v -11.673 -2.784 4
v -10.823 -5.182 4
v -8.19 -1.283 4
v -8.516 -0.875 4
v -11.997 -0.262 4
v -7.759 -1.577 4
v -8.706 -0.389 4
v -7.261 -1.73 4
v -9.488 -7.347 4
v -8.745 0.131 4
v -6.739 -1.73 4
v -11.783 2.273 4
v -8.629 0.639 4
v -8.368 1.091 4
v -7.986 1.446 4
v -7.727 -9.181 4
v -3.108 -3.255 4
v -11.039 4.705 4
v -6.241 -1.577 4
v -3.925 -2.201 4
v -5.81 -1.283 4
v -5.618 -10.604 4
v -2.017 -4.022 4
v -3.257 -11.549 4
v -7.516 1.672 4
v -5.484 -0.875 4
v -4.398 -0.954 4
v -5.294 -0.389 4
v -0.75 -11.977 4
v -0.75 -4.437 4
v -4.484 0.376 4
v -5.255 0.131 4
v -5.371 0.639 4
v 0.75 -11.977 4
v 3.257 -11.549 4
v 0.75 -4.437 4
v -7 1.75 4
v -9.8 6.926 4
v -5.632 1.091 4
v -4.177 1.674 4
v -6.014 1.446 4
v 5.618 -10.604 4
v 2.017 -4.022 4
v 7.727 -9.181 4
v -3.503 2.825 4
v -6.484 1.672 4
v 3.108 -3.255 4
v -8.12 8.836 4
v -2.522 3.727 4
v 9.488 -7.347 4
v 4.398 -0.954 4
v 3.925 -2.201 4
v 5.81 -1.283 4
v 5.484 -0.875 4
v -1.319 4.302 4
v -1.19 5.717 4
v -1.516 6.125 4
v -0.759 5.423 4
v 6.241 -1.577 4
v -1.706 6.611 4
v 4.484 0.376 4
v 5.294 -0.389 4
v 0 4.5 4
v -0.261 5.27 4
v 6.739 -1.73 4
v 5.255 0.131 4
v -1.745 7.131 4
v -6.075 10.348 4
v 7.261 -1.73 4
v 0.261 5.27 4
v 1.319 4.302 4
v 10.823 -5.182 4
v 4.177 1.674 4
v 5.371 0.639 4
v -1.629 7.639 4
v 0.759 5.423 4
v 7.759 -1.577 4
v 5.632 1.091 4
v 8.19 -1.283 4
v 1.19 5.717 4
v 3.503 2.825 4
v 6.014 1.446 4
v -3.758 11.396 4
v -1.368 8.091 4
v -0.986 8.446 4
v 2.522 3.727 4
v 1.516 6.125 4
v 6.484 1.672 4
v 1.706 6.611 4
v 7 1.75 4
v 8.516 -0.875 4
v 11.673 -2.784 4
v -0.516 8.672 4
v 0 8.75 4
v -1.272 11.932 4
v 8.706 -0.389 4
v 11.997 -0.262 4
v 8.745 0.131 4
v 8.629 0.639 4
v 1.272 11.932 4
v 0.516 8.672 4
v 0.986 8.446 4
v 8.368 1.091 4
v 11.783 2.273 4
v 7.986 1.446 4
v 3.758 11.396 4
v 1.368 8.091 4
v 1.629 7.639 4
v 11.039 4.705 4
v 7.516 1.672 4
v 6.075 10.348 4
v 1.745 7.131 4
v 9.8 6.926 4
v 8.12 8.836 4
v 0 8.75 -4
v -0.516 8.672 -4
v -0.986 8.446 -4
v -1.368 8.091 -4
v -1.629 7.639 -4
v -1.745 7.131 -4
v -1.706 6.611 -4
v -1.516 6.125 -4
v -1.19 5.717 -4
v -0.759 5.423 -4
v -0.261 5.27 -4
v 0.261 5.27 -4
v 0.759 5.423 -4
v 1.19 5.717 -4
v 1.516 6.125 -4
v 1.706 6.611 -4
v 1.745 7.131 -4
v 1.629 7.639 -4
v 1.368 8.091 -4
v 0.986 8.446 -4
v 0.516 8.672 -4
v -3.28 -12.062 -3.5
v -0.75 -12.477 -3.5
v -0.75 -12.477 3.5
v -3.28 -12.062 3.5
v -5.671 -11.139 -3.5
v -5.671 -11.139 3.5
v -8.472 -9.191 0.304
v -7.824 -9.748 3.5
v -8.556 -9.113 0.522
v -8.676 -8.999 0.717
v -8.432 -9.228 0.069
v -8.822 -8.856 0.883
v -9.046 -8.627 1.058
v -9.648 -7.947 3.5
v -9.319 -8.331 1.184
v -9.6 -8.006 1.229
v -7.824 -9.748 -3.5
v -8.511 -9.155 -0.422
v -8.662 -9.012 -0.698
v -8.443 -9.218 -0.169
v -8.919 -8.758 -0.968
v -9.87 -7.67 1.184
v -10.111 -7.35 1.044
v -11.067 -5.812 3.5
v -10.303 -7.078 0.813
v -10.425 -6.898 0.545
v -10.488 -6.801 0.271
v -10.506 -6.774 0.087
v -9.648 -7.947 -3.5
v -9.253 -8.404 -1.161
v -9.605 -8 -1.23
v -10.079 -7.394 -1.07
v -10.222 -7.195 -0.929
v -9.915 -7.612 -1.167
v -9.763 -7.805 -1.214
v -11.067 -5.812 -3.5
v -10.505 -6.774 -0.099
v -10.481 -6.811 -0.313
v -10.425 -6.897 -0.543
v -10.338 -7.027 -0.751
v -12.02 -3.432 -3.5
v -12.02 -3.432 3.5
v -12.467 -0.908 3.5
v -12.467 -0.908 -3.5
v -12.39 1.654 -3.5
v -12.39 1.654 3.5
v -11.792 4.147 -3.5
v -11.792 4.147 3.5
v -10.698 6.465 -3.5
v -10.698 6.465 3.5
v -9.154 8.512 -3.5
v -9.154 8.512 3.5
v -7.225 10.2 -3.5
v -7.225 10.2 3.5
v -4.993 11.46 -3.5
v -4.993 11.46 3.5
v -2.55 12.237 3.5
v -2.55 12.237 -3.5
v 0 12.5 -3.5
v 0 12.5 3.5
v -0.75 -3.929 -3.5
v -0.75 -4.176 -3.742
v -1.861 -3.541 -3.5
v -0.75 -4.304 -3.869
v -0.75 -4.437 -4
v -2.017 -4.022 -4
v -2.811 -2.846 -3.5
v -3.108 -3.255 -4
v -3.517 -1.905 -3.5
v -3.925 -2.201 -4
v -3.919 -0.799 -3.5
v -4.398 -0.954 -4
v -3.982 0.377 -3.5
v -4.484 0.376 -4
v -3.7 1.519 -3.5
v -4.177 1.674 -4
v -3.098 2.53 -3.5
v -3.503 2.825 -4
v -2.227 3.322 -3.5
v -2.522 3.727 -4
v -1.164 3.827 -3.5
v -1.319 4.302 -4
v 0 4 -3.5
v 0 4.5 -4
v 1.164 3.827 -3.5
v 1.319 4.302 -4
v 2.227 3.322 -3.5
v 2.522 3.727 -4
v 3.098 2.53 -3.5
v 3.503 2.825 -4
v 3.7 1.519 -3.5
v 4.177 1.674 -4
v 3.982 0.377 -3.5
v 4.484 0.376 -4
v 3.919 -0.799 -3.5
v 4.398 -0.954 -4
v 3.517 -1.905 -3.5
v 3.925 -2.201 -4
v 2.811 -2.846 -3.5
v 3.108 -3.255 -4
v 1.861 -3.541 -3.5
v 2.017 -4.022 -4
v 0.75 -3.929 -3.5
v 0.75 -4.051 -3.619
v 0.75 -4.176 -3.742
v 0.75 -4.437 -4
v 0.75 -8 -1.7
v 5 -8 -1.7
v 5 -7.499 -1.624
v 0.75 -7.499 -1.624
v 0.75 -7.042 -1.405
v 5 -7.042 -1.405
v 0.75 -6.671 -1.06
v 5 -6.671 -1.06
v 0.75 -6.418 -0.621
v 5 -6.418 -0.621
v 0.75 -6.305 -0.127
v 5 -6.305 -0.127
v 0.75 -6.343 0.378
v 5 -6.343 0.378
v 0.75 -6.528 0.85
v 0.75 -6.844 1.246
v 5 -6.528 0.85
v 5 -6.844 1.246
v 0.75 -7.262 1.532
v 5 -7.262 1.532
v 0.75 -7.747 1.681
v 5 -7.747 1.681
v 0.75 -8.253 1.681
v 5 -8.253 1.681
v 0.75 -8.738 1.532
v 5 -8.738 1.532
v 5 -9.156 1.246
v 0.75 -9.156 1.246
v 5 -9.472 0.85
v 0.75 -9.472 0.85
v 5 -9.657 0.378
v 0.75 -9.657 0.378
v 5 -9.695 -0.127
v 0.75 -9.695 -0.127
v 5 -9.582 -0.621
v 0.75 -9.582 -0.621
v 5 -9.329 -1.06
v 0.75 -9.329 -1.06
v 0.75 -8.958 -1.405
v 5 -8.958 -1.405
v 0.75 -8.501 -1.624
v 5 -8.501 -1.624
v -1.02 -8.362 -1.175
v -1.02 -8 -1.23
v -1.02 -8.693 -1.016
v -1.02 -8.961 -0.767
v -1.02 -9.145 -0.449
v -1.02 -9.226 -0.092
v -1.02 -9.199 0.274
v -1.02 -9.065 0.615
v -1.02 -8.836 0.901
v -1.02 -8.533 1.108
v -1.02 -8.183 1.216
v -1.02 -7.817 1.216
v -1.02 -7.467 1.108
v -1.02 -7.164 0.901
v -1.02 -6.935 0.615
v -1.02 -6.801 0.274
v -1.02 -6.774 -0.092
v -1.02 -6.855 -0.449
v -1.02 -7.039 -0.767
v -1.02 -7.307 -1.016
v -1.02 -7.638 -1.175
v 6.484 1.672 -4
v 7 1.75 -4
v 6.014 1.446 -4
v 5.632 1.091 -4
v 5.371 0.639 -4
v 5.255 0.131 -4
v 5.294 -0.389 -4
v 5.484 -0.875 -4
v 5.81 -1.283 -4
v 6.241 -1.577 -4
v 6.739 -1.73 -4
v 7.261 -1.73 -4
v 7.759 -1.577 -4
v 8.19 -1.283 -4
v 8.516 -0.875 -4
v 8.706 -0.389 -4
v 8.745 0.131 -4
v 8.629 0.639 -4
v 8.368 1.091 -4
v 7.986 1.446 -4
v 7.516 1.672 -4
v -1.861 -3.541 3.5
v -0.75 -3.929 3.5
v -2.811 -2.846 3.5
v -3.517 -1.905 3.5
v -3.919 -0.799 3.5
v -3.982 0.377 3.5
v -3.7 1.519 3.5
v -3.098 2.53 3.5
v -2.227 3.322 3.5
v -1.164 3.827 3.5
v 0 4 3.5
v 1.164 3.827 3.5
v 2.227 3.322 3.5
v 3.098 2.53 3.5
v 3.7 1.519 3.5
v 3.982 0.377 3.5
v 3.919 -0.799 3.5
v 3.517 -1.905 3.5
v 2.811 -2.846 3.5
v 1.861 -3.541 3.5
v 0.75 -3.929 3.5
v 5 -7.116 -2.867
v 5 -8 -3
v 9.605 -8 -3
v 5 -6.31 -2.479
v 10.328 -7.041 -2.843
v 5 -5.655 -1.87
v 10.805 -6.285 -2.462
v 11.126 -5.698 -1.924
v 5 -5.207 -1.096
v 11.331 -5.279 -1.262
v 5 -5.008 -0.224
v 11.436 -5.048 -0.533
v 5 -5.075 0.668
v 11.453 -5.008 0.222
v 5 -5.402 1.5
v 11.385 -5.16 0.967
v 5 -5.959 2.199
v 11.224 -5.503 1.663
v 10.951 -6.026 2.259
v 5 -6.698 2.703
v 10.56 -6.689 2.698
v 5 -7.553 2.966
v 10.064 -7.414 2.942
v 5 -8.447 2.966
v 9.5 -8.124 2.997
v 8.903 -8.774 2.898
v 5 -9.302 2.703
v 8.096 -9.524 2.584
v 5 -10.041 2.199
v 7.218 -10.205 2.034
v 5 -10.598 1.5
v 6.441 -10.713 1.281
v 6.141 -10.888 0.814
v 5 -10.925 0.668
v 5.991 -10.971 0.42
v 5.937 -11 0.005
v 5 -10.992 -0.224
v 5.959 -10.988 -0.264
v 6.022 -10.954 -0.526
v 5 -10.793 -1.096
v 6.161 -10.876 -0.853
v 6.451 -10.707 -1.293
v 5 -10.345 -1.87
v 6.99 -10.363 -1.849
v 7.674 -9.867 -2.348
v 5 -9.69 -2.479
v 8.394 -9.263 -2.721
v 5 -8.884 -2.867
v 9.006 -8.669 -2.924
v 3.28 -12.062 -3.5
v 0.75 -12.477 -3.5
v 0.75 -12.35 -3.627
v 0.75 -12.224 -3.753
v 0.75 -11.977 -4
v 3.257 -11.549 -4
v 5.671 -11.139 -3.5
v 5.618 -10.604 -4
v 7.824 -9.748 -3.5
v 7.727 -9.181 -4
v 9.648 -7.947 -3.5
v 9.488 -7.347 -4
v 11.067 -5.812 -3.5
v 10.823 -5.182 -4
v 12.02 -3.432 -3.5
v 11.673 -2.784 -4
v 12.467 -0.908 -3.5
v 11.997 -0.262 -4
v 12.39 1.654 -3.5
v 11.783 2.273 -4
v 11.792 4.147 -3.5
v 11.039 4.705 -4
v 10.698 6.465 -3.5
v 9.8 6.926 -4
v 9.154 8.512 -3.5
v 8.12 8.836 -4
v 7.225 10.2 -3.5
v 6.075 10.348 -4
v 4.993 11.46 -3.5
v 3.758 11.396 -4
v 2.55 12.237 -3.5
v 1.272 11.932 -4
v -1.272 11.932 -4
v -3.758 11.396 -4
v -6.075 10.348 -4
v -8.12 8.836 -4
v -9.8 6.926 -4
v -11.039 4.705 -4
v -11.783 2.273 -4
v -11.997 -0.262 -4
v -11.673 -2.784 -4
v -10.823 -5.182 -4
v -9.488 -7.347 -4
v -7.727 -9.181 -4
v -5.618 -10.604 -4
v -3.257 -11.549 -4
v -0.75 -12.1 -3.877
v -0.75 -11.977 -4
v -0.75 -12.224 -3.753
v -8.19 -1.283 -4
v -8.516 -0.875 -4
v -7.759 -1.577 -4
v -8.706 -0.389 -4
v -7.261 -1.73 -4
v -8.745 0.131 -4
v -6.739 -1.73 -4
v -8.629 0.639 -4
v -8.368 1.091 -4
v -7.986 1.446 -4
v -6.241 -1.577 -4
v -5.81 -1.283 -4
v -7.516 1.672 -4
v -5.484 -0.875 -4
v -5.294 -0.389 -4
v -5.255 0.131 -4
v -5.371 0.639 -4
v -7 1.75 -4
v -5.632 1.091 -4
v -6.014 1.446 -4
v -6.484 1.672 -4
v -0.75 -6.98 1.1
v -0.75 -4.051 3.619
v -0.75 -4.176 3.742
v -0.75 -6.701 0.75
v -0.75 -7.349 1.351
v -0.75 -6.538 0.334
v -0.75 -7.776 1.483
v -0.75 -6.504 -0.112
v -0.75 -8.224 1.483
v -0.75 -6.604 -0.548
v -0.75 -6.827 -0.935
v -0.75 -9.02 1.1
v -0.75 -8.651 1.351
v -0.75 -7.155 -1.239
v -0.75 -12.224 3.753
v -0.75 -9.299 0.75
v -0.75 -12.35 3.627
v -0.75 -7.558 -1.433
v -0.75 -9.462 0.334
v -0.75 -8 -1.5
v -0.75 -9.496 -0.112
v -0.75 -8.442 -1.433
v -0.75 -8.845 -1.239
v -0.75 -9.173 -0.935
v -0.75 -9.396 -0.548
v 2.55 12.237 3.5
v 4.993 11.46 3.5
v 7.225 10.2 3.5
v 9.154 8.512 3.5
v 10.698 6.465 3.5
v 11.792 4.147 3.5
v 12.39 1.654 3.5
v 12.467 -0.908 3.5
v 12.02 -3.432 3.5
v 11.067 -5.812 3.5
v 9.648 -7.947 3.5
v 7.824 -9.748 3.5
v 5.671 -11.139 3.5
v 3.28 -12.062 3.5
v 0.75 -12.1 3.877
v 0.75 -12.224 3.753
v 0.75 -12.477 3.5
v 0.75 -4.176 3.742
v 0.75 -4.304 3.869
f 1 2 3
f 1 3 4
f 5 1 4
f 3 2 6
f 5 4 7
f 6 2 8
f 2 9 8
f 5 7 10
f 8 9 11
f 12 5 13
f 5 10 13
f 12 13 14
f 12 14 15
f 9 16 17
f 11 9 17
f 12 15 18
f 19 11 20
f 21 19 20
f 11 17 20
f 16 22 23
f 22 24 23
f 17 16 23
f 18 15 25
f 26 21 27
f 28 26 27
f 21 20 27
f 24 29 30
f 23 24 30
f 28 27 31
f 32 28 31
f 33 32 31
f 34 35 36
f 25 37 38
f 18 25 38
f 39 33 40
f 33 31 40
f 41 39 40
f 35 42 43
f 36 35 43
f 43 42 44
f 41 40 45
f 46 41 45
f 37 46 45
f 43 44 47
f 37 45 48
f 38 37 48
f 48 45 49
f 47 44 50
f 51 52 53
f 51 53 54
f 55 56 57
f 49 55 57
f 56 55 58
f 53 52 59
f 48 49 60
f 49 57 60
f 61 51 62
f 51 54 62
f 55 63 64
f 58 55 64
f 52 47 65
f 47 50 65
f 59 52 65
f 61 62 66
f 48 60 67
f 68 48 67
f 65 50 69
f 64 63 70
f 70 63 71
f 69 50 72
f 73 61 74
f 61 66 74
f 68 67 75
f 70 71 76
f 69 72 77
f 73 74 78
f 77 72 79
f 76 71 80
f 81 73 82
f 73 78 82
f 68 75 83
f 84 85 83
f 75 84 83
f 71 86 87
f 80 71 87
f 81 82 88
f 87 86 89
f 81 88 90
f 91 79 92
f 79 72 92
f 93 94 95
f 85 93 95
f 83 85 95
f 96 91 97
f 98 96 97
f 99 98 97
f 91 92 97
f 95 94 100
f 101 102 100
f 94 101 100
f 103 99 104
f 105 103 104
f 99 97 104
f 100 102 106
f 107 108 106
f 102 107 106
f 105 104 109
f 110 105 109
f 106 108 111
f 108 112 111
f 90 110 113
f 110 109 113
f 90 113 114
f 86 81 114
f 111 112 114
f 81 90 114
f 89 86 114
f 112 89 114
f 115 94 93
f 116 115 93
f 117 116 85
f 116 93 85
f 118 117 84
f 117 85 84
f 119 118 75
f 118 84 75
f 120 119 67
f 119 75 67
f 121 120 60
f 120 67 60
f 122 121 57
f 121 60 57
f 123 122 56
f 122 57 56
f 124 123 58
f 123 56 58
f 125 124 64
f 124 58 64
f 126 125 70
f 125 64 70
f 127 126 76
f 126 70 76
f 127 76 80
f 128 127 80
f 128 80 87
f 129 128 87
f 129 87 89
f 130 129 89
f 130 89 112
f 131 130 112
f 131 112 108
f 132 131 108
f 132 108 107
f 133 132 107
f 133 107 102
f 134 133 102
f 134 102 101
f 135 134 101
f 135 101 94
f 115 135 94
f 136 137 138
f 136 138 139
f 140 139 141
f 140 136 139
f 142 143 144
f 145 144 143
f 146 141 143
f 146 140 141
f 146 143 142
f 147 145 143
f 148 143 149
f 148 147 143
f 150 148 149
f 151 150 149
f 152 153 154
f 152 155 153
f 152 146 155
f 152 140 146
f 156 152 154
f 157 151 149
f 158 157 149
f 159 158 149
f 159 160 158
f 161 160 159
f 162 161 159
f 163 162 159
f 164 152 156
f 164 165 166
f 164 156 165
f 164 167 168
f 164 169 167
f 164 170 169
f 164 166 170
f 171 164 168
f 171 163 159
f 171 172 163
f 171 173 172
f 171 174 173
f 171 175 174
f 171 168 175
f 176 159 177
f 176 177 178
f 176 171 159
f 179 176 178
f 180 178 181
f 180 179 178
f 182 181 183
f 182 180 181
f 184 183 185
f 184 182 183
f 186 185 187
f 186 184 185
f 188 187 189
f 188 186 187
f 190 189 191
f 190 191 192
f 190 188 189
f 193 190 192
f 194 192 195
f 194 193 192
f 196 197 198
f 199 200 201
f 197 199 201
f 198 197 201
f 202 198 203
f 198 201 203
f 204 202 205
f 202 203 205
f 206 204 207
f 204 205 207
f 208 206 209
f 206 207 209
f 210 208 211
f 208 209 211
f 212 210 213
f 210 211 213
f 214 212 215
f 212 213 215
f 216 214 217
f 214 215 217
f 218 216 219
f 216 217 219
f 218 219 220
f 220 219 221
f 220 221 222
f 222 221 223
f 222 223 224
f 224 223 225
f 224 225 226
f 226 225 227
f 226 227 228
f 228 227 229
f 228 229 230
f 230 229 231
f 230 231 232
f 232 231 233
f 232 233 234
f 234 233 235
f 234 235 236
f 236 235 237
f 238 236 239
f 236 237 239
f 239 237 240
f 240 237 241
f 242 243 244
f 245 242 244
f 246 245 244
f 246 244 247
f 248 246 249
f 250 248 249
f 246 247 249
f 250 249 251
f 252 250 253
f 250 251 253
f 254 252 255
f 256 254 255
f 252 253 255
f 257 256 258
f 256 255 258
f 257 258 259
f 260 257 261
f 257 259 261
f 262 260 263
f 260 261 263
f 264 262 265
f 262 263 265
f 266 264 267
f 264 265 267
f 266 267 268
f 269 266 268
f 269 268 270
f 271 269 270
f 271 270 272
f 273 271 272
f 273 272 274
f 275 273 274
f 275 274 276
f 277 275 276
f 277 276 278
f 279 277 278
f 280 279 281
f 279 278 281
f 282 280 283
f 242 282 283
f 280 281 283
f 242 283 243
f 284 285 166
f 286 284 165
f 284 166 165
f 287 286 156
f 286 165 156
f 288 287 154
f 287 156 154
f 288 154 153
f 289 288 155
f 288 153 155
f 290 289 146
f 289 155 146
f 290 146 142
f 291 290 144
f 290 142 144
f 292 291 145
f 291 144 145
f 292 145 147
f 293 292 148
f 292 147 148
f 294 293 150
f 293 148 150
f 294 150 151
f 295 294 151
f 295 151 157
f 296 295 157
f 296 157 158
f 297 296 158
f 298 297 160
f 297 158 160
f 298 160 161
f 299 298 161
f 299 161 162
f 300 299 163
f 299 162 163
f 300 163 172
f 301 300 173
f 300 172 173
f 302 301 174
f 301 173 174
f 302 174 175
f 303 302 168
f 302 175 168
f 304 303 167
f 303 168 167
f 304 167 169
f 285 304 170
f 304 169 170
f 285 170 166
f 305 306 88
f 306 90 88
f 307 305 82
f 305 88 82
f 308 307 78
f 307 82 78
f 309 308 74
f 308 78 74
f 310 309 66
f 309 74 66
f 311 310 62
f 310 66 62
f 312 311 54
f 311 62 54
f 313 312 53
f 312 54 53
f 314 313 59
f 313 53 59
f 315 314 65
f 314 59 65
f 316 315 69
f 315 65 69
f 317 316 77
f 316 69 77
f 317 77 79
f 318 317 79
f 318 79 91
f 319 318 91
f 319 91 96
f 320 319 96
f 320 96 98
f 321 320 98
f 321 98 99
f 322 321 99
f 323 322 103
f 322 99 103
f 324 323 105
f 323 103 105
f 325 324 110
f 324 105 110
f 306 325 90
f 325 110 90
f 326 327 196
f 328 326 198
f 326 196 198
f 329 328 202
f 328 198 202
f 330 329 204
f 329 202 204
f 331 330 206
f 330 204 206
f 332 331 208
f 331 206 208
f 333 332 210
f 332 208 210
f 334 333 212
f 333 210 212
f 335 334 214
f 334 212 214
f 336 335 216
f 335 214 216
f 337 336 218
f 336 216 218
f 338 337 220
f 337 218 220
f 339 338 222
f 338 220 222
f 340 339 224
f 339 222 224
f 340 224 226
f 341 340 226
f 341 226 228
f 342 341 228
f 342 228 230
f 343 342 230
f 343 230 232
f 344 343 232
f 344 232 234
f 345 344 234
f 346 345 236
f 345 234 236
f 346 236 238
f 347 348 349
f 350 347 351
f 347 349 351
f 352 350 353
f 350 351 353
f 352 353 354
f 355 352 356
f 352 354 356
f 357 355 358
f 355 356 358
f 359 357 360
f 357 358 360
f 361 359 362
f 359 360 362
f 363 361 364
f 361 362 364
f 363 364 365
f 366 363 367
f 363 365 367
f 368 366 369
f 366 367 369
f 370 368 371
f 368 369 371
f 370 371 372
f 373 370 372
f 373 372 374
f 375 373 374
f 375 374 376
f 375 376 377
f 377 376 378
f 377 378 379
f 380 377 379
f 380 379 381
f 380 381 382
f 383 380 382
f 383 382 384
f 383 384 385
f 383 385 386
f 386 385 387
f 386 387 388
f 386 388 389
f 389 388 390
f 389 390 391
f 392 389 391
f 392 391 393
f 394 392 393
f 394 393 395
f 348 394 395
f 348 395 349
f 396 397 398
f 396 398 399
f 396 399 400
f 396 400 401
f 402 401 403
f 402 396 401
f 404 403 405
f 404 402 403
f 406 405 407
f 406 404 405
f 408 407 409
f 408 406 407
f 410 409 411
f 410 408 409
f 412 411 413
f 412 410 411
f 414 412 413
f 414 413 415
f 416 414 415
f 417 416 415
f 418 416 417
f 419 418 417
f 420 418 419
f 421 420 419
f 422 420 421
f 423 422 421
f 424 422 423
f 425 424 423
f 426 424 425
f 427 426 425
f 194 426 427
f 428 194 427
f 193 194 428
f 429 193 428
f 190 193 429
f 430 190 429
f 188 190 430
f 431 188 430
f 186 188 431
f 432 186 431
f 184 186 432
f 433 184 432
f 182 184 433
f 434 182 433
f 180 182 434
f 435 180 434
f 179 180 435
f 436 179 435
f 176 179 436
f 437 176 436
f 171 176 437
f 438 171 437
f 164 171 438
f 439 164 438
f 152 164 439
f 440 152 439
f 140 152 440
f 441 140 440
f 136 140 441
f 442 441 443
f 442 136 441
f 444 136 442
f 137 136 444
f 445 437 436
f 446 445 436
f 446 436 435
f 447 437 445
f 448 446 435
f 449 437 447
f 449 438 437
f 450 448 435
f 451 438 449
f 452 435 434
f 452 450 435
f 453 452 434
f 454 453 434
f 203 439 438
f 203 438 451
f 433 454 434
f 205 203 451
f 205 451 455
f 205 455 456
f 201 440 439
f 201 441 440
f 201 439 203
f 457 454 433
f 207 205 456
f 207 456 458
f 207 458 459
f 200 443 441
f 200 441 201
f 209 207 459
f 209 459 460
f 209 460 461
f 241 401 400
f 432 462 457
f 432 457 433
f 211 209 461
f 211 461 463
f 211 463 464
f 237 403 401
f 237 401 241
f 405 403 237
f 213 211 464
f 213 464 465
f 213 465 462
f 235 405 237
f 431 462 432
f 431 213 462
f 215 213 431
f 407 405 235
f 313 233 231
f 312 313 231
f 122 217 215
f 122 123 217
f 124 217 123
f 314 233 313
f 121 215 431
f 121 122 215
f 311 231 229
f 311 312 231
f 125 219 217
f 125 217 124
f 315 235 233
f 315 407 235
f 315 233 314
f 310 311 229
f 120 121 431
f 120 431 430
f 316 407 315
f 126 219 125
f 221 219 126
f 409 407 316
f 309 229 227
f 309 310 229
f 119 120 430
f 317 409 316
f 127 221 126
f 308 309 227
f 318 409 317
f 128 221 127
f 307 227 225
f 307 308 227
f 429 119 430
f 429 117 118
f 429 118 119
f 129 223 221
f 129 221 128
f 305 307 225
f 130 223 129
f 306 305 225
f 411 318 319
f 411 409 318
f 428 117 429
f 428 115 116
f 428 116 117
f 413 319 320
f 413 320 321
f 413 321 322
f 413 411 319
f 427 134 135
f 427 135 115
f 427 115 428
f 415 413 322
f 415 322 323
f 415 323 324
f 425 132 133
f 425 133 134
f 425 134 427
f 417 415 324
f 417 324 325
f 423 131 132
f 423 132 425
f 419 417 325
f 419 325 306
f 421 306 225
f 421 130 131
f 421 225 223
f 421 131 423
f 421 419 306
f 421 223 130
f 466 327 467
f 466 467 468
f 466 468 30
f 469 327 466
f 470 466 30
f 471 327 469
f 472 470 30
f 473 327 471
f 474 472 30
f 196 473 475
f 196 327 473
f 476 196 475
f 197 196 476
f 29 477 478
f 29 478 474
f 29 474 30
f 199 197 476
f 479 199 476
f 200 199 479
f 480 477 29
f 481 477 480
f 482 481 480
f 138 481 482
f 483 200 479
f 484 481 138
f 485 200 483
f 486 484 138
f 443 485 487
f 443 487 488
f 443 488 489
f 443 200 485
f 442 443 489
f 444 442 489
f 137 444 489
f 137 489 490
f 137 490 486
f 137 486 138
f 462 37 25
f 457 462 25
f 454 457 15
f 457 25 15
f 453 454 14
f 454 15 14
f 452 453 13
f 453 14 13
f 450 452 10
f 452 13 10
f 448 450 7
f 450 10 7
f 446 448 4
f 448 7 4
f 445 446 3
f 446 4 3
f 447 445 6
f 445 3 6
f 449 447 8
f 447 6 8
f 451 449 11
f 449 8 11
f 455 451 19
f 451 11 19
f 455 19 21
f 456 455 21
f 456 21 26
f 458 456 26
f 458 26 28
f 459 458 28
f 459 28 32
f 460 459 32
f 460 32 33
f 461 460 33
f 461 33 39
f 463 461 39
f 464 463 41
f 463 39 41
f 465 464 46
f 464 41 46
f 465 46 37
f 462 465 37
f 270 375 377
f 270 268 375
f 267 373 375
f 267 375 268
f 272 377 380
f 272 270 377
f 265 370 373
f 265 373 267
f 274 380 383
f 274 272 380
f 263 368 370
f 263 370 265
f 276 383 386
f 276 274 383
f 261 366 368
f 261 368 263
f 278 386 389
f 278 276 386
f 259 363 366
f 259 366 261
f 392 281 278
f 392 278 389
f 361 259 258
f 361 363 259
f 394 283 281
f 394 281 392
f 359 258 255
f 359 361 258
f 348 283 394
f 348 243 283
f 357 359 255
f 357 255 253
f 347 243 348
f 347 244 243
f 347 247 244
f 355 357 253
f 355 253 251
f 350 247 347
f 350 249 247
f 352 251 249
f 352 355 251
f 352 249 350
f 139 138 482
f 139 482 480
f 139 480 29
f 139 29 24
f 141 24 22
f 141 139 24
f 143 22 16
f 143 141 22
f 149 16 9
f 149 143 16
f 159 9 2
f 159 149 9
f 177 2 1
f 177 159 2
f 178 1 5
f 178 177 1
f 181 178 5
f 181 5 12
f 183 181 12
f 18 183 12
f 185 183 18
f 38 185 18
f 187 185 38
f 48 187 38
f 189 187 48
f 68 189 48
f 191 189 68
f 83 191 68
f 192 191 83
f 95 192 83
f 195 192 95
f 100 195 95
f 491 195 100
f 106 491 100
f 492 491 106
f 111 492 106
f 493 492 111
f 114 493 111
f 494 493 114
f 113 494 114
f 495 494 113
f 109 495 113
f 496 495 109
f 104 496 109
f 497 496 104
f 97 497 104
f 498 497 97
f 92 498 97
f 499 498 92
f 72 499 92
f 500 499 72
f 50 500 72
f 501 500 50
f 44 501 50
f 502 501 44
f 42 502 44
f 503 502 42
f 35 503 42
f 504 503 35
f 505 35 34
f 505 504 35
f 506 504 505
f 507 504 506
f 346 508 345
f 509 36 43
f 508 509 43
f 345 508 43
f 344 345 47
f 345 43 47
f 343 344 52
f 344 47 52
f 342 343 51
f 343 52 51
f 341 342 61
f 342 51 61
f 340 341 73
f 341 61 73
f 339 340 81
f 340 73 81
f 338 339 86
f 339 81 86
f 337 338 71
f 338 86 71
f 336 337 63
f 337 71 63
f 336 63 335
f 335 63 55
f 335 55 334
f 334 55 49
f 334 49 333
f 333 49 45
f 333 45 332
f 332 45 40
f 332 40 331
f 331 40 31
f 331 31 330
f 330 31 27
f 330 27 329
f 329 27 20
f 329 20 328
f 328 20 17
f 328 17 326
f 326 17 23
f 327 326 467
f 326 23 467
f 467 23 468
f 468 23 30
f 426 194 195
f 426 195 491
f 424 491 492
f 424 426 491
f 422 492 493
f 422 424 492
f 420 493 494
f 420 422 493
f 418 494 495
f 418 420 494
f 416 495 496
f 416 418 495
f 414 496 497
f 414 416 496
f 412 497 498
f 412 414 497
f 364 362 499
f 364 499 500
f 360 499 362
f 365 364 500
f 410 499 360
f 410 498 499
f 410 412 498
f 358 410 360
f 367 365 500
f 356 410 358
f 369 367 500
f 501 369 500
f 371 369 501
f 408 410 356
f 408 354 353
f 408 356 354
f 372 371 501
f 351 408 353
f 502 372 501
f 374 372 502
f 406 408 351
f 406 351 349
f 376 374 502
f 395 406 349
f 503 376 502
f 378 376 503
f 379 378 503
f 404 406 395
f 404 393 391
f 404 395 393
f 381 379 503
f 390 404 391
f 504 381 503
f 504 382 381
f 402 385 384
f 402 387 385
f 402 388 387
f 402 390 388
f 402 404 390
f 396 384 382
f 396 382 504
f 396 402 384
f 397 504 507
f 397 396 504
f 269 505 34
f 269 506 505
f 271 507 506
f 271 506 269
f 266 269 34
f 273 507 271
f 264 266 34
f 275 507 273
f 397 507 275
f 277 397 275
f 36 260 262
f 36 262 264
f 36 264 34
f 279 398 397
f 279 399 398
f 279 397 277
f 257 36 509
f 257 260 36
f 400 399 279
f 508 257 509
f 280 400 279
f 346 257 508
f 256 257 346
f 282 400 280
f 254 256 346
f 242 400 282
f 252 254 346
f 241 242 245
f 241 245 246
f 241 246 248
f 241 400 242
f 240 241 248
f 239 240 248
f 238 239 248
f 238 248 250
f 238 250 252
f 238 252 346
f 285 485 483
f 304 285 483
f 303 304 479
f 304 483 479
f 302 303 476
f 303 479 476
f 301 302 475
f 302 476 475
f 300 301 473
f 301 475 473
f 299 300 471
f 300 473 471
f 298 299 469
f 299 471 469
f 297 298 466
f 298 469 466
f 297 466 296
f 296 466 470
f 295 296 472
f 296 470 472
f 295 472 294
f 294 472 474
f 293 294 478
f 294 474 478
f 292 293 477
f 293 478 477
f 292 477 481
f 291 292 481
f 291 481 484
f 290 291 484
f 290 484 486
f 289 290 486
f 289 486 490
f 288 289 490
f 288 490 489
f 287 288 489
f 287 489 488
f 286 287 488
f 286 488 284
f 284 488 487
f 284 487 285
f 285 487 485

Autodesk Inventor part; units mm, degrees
sketch "Sketch_14" plane through (0, 0, 0) normal (1, 0, 0) x (0, 1, 0)
  line L0 (0, -4) -> (0, 4)
  line L1 (0, 4) -> (12, 4)
  line L2 (12, 4) -> (12.5, 3.5)
  line L3 (12.5, 3.5) -> (12.5, -3.5)
  line L4 (12.5, -3.5) -> (12, -4)
  line L5 (12, -4) -> (0, -4)
  line L6 (0, -4) -> (0, 4)
revolve "Revolution1" add sketch "Sketch_14" angle 360 about axis through (0, 0, -4) along (0, 0, -1)
sketch "Sketch_15" plane through (0, 0, 0) normal (1, 0, 0) x (0, 1, 0)
  line L0 (0, -4) -> (0, 4)
  line L1 (0, 4) -> (4.5, 4)
  line L2 (4.5, 4) -> (4, 3.5)
  line L3 (4, 3.5) -> (4, -3.5)
  line L4 (4, -3.5) -> (4.5, -4)
  line L5 (4.5, -4) -> (0, -4)
  line L6 (0, -4) -> (0, 4)
revolve "Revolution2" cut sketch "Sketch_15" angle 360 about axis through (0, 0, -4) along (0, 0, -1)
sketch "Sketch_16" plane through (0, 0, 0) normal (0, 0, 1) x (1, 0, 0)
  arc A0 (-0.75, -13.4792) -> (0.75, -13.4792) centre (0, 0) ccw
  line L0 (0.75, -13.4792) -> (0.75, 0)
  line L1 (0.75, 0) -> (-0.75, 0)
  line L2 (-0.75, 0) -> (-0.75, -13.4792)
extrude "Extrusion1" cut sketch "Sketch_16" along normal mid plane 8
sketch "Sketch4" plane through (0, 0, -4) normal (0, 0, -1) x (-1, 0, 0)
  point P0 (-7, 0)
hole "Hole1" at (7, 0, -4) direction (0, 0, 1) diameter 3.5 depth 8
sketch "Sketch5" plane through (0, 0, -4) normal (0, 0, -1) x (-1, 0, 0)
  point P0 (7, 0)
hole "Hole2" at (-7, 0, -4) direction (0, 0, 1) diameter 3.5 depth 8
sketch "Sketch6" plane through (0, 0, -4) normal (0, 0, -1) x (-1, 0, 0)
  point P0 (0, 7)
hole "Hole3" at (0, 7, -4) direction (0, 0, 1) diameter 3.5 depth 8
sketch "Sketch_23" plane through (0, -8, 0) normal (0, 1, 0) x (1, 0, 0)
  line L0 (12.5, 0) -> (0, 0)
  line L1 (0, 0) -> (0, 1.7)
  line L2 (0, 1.7) -> (5, 1.7)
  line L3 (5, 1.7) -> (5, 3)
  line L4 (5, 3) -> (12.5, 3)
  line L5 (12.5, 3) -> (12.5, 0)
  line L6 (12.5, 0) -> (0, 0)
revolve "Revolution3" cut sketch "Sketch_23" angle 360 about axis through (12.5, -8, 0) along (1, 0, 0)
sketch "Sketch8" plane through (-0.75, -11.9765, 4) normal (1, 0, 0) x (0, 0, -1)
  point P0 (4, 3.9765)
hole "Hole4" at (-0.75, -8, 0) direction (-1, 0, 0) diameter 2.459 depth 9.9271 countersink diameter 3 countersink angle 90 thread size "M3x0.5" class "6H" standard "ISO Metric profile"
ref_plane "to_bolt_XY" through (5, -8, 0) normal (1, 0, 0) x (0, 0, -1)
ref_plane "to_bolt_YZ" through (5, -8, 0) normal (0, 0, -1) x (0, 1, 0)
ref_plane "to_bolt_ZX" through (5, -8, 0) normal (0, 1, 0) x (1, 0, 0)
properties part number "SCST8-8b"
